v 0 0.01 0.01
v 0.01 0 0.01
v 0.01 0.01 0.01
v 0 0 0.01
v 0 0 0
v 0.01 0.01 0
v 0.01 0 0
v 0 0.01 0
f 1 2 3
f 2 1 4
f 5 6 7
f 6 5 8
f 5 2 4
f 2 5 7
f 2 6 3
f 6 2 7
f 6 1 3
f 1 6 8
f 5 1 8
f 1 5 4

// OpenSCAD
// file: dock.scad
// umote case v7: the charging dock (as v6, with the pocket cut from the keel envelope) and its swappable contact plates (A: P75 probes + magnets, B: a
// ready-made magnetic connector's other half).

// ---------- dock ----------
// Holds the remote upright on its bottom end, leaning back dock_lean, screen towards the user. Two
// P75-B1 probes stand pogo_proud out of the pocket floor (the remote's end face), so they compress
// that much onto the brass pads; two 10 x 2 magnets face the remote's. Built in remote coordinates.
dock_lean = 15;  pogo_proud = 0.75;  dock_pocket = 16;  dock_g = 0.4;
usbc_bo = [13, 11, 4];              // USB-C breakout board pocket [CHECK]
module remote_to_world() rotate([dock_lean - 90, 0, 0]) translate([0, -L, 0]) children();
module world_to_remote() translate([0, L, 0]) rotate([90 - dock_lean, 0, 0]) children();
// one straight press-fit hole per probe, right through to the wire channel under the floor (a wider
// wire hole below would leave a ledge facing down); glue if the press fit is loose
module pogo_holes() for (sx = [-1, 1]) translate([sx * pad_x, L - 0.5, pad_z]) rotate([-90, 0, 0]) cylinder(d = pogo_d, h = 40, $fn = 24);
module pogo_tips() for (sx = [-1, 1]) translate([sx * pad_x, L - pogo_proud, pad_z]) rotate([-90, 0, 0]) cylinder(d = 0.74, h = pogo_l, $fn = 16);
module dock_raw() difference() {
  world_to_remote() translate([-32, -16, -20]) cube([64, 34, 20 + 12]);
  intersection() { envelope(dock_g); translate([-50, L - dock_pocket - 30, -20]) cube([100, dock_pocket + 30, 60]); }
  world_to_remote() translate([-usbc_bo[0] / 2, 18 - usbc_bo[1] + 0.01, -20 - 0.01]) cube([usbc_bo[0], usbc_bo[1], usbc_bo[2]]);   // breakout, port at the back
  world_to_remote() translate([-1, -2, -20]) cube([2, 20, usbc_bo[2] - 1]);                                                         // wires under the floor
}
// the dock's half of the contacts is a swappable plate too: a block under the remote's end, its top
// the pocket floor; it drops into the dock from the pocket (press fit, a drop of glue if loose)
dp_t = 6.0;
module dp_region(g = 0) translate([-pp_w / 2 - g, L - 2, pp_z0 - g]) cube([pp_w + 2 * g, 2 + dock_g + dp_t + g, pz0 - 0.05 - pp_z0 + 2 * g]);
module dock() difference() { dock_raw(); dp_region(0.2); pogo_holes(); }
module dock_plate_a() difference() {   // P75 probes onto plate A's pads, 10 x 2 magnets facing plate A's
  intersection() { dock_raw(); dp_region(0); }
  pogo_holes();
  for (sx = [-1, 1]) translate([sx * dmag_x, L - 0.5, dmag_z]) rotate([-90, 0, 0]) cylinder(d = magnet[0] + 0.2, h = magnet[1] + 0.6, $fn = 64);
}
module dock_plate_b() difference() {   // the connector's other half, flush with the pocket floor
  intersection() { dock_raw(); dp_region(0); }
  translate([-conn_b[0] / 2 - 0.15, L - 1, pad_z - conn_b[1] / 2 - 0.15]) cube([conn_b[0] + 0.3, dp_t + 5, conn_b[1] + 0.3]);
  for (sx = [-1, 1]) translate([sx * conn_b[3] / 2, L + dock_g + dp_t + 0.01, pad_z]) rotate([90, 0, 0]) cylinder(d = conn_b[4], h = 4.0, $fn = 24);
}
// file: backs.scad
// umote case v7: the two BACK PLATES. Each is flat on its outside, so it prints outside down with
// nothing but the foot chamfer touching the bed; they meet at the keel line (y_ap) on a 45 deg
// bevel. The head plate carries the display posts and the wheel's well and is held by 6 screws
// (4 through the display's corner holes into the face bosses, 2 into the cheeks). The key plate is
// the battery door: two tongues under the cheeks, the bevel, and 2 screws at the bottom end.
scarf_x = 18.5;  sc_step = 0.8;     // bevel across the middle (|x| < scarf_x), after a 0.8 square edge
post_d = 5.2;  post_base = [7.5, 3.4];   // display posts: d under the board; d and top z of the wider foot (takes the sunk screw head)
rib_x = [-15, 0, 15];  rib_w2 = 2.4;     // battery seat ribs (the space between them is free for wires)

// the head plate's side of the split; g moves the cut (negative: towards the key side)
module head_side(g = 0) union() {
  translate([-100, -200, -50]) cube([200, 200 + y_ap - g, 100]);
  translate([-scarf_x, 0, 0]) rotate([90, 0, 90]) linear_extrude(2 * scarf_x)
    polygon([[y_ap - 1, z_ap + sc_step], [y_ap - g, z_ap + sc_step], [y_ap - g + 4, z_ap + sc_step + 4], [y_ap - 1, z_ap + sc_step + 4]]);
}
module plate_layer() difference() { envelope(); above_seam(); }
module vgroove() translate([0, y_ap + 0.075, z_ap]) rotate([45, 0, 0]) cube([80, 0.75, 0.75], center = true);   // the seam reads as one 0.5 V line
// locating lip inside the shell's side walls, with a stepped lead-in
module lip(y0, y1) intersection() {
  translate([-50, y0, -50]) cube([100, y1 - y0, 100]);
  union() {
    intersection() { band(back_t - 0.01, back_t + lip_h - 0.6); translate([0, 0, -40]) linear_extrude(80) difference() { plan(wall + lip_clr); plan(wall + lip_clr + lip_w); } }
    intersection() { band(back_t + lip_h - 0.61, back_t + lip_h); translate([0, 0, -40]) linear_extrude(80) difference() { plan(wall + lip_clr + 0.5); plan(wall + lip_clr + lip_w); } }
  }
}
// M2 countersunk from the back at p, the head's top at z
module csk_at(p, z) translate([p[0], p[1], 0]) {
  translate([0, 0, z - m2[3]]) m2_csk(30);
  translate([0, 0, -30]) cylinder(d = m2[2], h = 30 + z - m2[3] + 0.01, $fn = 32);
}

module head_back() difference() {
  union() {
    intersection() { plate_layer(); head_side(); }
    intersection() { above_back(back_t - 0.01); union() {
      lip(12, y_head_end - 0.6);
      for (h = holes) translate([h[0], h[1], -30]) { cylinder(d = post_d, h = 30 + db_z0, $fn = 48); cylinder(d = post_base[0], h = 30 + post_base[1], $fn = 48); }
    } }
  }
  wheel_room();
  for (h = holes) csk_at(h, max(z_seat, zb(h[1]) + m2[3]));
  for (p = s2) csk_at(p, zb(p[1]) + m2[3]);
  vgroove();
}
batt_stop = [[-8, 4], [8, 4]];      // x, width: two low wedges at the battery's top end
module key_back() difference() {
  union() {
    difference() { plate_layer(); head_side(-0.15); }
    intersection() { above_back(back_t - 0.01); union() {
      lip(y_ap + 4.5, 170);
      for (x = rib_x) translate([x - rib_w2 / 2, batt_y0 + 2, -30]) cube([rib_w2, batt[1] - 4, 30 + floor_t]);
      // 45 deg face towards the battery: the plate comes off along that line
      for (s = batt_stop) let(b = batt_y0 - 0.4) translate([s[0] - s[1] / 2, 0, 0]) rotate([90, 0, 90]) linear_extrude(s[1])
        polygon([[b, -30], [b, floor_t], [b - 1.2, floor_t + 1.2], [b - 3.0, floor_t + 1.2], [b - 3.0, -30]]);
      for (g = groove_x) translate([g[0] + fit, 0, 0]) rotate([90, 0, 90]) linear_extrude(g[1] - g[0] - 2 * fit) tongue2d(0);
    } }
  }
  for (p = ps) csk_at(p, zb(p[1]) + m2[3]);
  vgroove();
}
// print orientation: outside down. Turning about x by atan(-slope) lays the plate's plane flat.
module head_back_print() translate([0, 0, -zb_tip * cos(atan(-kh))]) rotate([atan(-kh), 0, 0]) children();
module key_back_print() translate([0, 0, -(z_ap - kk * y_ap) * cos(atan(-kk))]) rotate([atan(-kk), 0, 0]) children();
// file: wheel.scad
// umote case v7: the roller's bought parts (for the fit check and the viewer) and the printed wheel.
// Unchanged from v6: EC11 on its side, shaft along -x, bushing through a bulkhead with its nut.
win = [whl_w + 0.8, 2 * sqrt(pow(whl_d / 2 + whl_gap, 2) - pow(pz0 - axle_z, 2))];   // wheel window in the face: x, y
room_y1 = y_key_start - col_wall;
s2 = [for (sx = [-1, 1]) [sx * 20.2, cy + 6.5]];           // head plate -> cheeks

module ec11_model() {
  translate([ec11_xf, cy - ec11_d / 2, axle_z - ec11_w / 2]) cube([ec11_h, ec11_d, ec11_w]);                  // body
  translate([ec11_xf + 0.01, cy, axle_z]) rotate([0, -90, 0]) cylinder(d = ec11_bush[0], h = ec11_bush[1] + 0.01, $fn = 48);   // bushing
  translate([ec11_xf, cy, axle_z]) rotate([0, -90, 0]) difference() {                                              // D shaft
    cylinder(d = ec11_shaft[0], h = ec11_shaft[1], $fn = 48);
    translate([-10, ec11_shaft[2] - ec11_shaft[0] / 2, ec11_shaft[1] - ec11_shaft[3]]) cube([20, 10, 20]);
  }
  // pins: out of the body's side, bent back through the carrier, trimmed 1.0 past it
  for (r = [0, 1], k = r == 0 ? [-1, 0, 1] : [-1, 1]) let(py = cy + ec11_rows[r], pz = axle_z + k * ec11_pitch) {
    translate([ec11_xf + ec11_h - 0.01, py - 0.4, pz - 0.4]) cube([carrier[0] + 1.0, 0.8, 0.8]);
    hull() { translate([ec11_xf + ec11_h - 0.8, py - 0.4, pz - 0.4]) cube([0.8, 0.8, 0.8]);
             translate([ec11_xf + ec11_h - 0.8, cy + sign(ec11_rows[r]) * (ec11_d / 2 - 0.5) - 0.4, pz - 0.4]) cube([0.8, 0.8, 0.8]); }
  }
}
module ec11_nut_model() translate([ec11_xf - bulk_t - ec11_nut[1], cy, axle_z]) rotate([0, 90, 0])
  rotate(30) cylinder(d = ec11_nut[0] / cos(30), h = ec11_nut[1], $fn = 6);
module carrier_model() translate([ec11_xf + ec11_h, cy - 8.75, 0.1]) cube([carrier[0], carrier[1], carrier[2]]);

// knurled wheel, D-bore for the EC11 shaft
module wheel() { difference() {
  rotate([0, 90, 0]) cylinder(d = whl_d, h = whl_w, center = true, $fn = 96);
  for (a = [0 : 10 : 359]) rotate([a, 0, 0]) translate([0, 0, whl_d / 2]) cube([whl_w + 1, 0.9, 0.9], center = true);
  rotate([0, 90, 0]) difference() { cylinder(d = ec11_shaft[0] + 0.15, h = whl_w + 2, center = true, $fn = 48);
    translate([ec11_shaft[2] - ec11_shaft[0] / 2 + 0.075, -5, -10]) cube([10, 10, 20]); }       // D flat
} }
module wheel_at() translate([whl_x, cy, axle_z]) wheel();
module wheel_room() translate([whl_x, cy, axle_z]) rotate([0, 90, 0]) cylinder(r = whl_d / 2 + whl_gap, h = whl_w + 2 * whl_gap, center = true, $fn = 96);
// file: profile.scad
// umote case v7: the outer form (plan outline, cross-section, the keel). Include after params.scad.

module base2d() { hull() {
  for (sx = [-1, 1]) translate([sx * (W / 2 - tip_r), tip_r]) circle(r = tip_r);
  for (sx = [-1, 1]) translate([sx * (W / 2 - corner_r), L - corner_r]) circle(r = corner_r);
} }
module plan(i = 0) { if (i == 0) base2d(); else offset(r = -i) base2d(); }   // negative i grows it
module rr2d(w, l, r) { offset(r = r) square([w - 2 * r, l - 2 * r], center = true); }

// plan inset of the outer surface. Below eb: z is the height above the local back (a 35 deg bed
// foot, then a quarter ellipse into the side). From roll_z up: the roll round the face.
foot_in = ea * (1 - sqrt(1 - pow((eb - bed_ch) / eb, 2)));
function e_in(z) = z < bed_ch ? foot_in + foot_k * (bed_ch - z)
  : z < eb ? ea * (1 - sqrt(1 - pow((eb - z) / eb, 2)))
  : z < roll_z ? 0 : roll * pow((z - roll_z) / (T - roll_z), 2);

// one hull between two plan slices; a stack of them follows e_in() (each band is convex)
module slab(z0, z1, i0, i1) { hull() {
  translate([0, 0, z0]) linear_extrude(0.01) plan(i0);
  translate([0, 0, z1 - 0.01]) linear_extrude(0.01) plan(i1);
} }
module stack(z0, z1, n, extra = 0) {
  for (k = [0 : n - 1]) { a = z0 + (z1 - z0) * k / n; b = z0 + (z1 - z0) * (k + 1) / n;
    slab(a, b, e_in(a) + extra, e_in(b) + extra); }
}
// the lower half standing on z = 0: the bed foot and the ellipse, then straight up. Sheared along y
// it becomes the head's or the key half's back: vertical lines stay vertical, so the outline and the
// walls are untouched and every cross-section is the same shape let down by zb(y).
module cup(g = 0) union() {
  slab(-g, bed_ch, e_in(0) - g, e_in(bed_ch) - g);
  stack(bed_ch, eb, 12, -g);
  translate([0, 0, eb - 0.01]) linear_extrude(60) plan(-g);
}
module shear_h() multmatrix([[1, 0, 0, 0], [0, 1, 0, 0], [0, kh, 1, zb_tip], [0, 0, 0, 1]]) children();
module shear_k() multmatrix([[1, 0, 0, 0], [0, 1, 0, 0], [0, kk, 1, z_ap - kk * y_ap], [0, 0, 0, 1]]) children();
module upper(g = 0) union() {
  translate([0, 0, -30]) linear_extrude(30 + roll_z) plan(-g);
  stack(roll_z, T, 10, -g);
  if (g > 0) slab(T - 0.01, T + g, e_in(T) - g, e_in(T) - g);
}
// the whole remote's outer form; g grows it all round (the dock's pocket)
module envelope(g = 0) intersection() { upper(g); shear_h() cup(g); shear_k() cup(g); }

// everything d above the back surface (d = back_t: above the seam between the shell and the plates)
module slabs_up() translate([-100, -200, 0]) cube([200, 700, 100]);
module above_back(d) intersection() { shear_h() translate([0, 0, d]) slabs_up(); shear_k() translate([0, 0, d]) slabs_up(); }
module above_seam() above_back(back_t);
module band(d0, d1) difference() { above_back(d0); above_back(d1); }      // between two offsets of the back

// the face: the envelope's top pan_t
module ycut(y0, y1) { intersection() { children(); translate([-60, y0, -40]) cube([120, y1 - y0, 80]); } }

// horizontal holes with a teardrop roof: towards +z, or towards -z (down = true) for the shell,
// which prints face down
module td_y(d, y0, y1, down = false) translate([0, y0, 0]) rotate([-90, 0, 0]) linear_extrude(y1 - y0) mirror([0, down ? 1 : 0])
  polygon(concat([for (k = [0 : 23]) let(t = -38.7 + 257.4 * k / 23) [d / 2 * cos(t), d / 2 * sin(t)]], [[0, -d / 2 * 1.6]]));
module td_x(d, x0, x1, down = false) translate([x0, 0, 0]) rotate([0, 90, 0]) linear_extrude(x1 - x0) mirror([down ? 1 : 0, 0])
  polygon(concat([for (k = [0 : 23]) let(t = 231.3 + 257.4 * k / 23) [d / 2 * cos(t), d / 2 * sin(t)]], [[-d / 2 * 1.6, 0]]));
// main file
// umote case v7 "Keel": part dispatcher. Print parts come out in print orientation; asm_* parts are
// in model (assembled) coordinates for the fit check and viewer.
// Render: openscad -D 'part="shell"' -o shell.stl case/v7/umote_v7.scad   (or case/v7/export.sh)
part = "params";
$fn = 64;
include <params.scad>
include <profile.scad>
include <wheel.scad>
include <keys.scad>
include <shell.scad>
include <backs.scad>
include <dock.scad>

// every value the checks need, as one JSON line
P = [["W", W], ["wall", wall], ["tip_wall", tip_wall], ["T", T], ["L", L], ["theta", theta], ["clr", clr],
  ["board_gap", board_gap], ["usb_x", usb_x], ["usb_in", usb_in], ["usb_body_h", usb_body_h], ["usb_floor", usb_floor],
  ["db_w", db_w], ["db_l", db_l], ["db_pcb", db_pcb], ["db_front", db_front], ["db_back", db_back], ["db_y0", db_y0],
  ["db_end", db_end], ["db_top", db_top], ["db_z0", db_z0], ["lcd_from_ant", lcd_from_ant], ["lcd_l", lcd_l],
  ["bb_w", bb_w], ["bb_l", bb_l], ["bb_pcb", bb_pcb], ["bb_y0", bb_y0], ["bb_z0", bb_z0], ["bb_top", bb_top],
  ["sw_body", sw_body], ["sw_total", sw_total], ["smd_h", smd_h], ["top_parts", top_parts],
  ["batt", batt], ["batt_y0", batt_y0], ["batt_z0", batt_z0], ["floor_t", floor_t],
  ["ir_x", ir_x], ["ir_z", ir_z], ["front_in", front_in], ["pan_t", pan_t], ["pz0", pz0],
  ["y_head_end", y_head_end], ["y_key_start", y_key_start], ["cy", cy], ["axle_z", axle_z],
  ["whl_d", whl_d], ["whl_w", whl_w], ["whl_x", whl_x], ["whl_proud", whl_proud], ["whl_gap", whl_gap], ["whl_well", whl_well],
  ["ec11_xf", ec11_xf], ["ec11_h", ec11_h], ["ec11_w", ec11_w], ["ec11_d", ec11_d], ["ec11_bush", ec11_bush], ["ec11_shaft", ec11_shaft],
  ["ec11_nut", ec11_nut], ["carrier", carrier], ["bulk_t", bulk_t], ["room_x", room_x], ["col_wall", col_wall],
  ["s2", s2], ["ps", ps], ["m2", m2], ["holes", holes], ["win", win], ["groove_x", groove_x], ["fit", fit],
  ["back_t", back_t], ["zb_tip", zb_tip], ["y_ap", y_ap], ["z_ap", z_ap], ["kh", kh], ["kk", kk], ["z_seat", z_seat],
  ["lip_clr", lip_clr], ["lip_w", lip_w], ["lip_h", lip_h], ["tap_depth", tap_depth], ["boss_hole", boss_hole],
  ["min_wall", min_wall], ["min_panel", min_panel], ["min_land", min_land], ["min_skin", min_skin],
  ["magnet", magnet], ["dmag_x", dmag_x], ["dmag_z", dmag_z], ["pad_insert", pad_insert], ["pad_x", pad_x], ["pad_z", pad_z],
  ["pogo_d", pogo_d], ["pogo_l", pogo_l], ["roll_z", roll_z], ["roll", roll], ["cap_proud", cap_proud],
  ["pp_w", pp_w], ["pp_z0", pp_z0], ["pp_t", pp_t], ["conn_b", conn_b], ["end_block_y", end_block_y],
  ["cap_hole", cap_hole], ["cap_d", cap_d], ["side_clr", side_clr], ["batt_end", batt_end], ["bb_end", bb_end], ["eye", eye],
  ["clip_y", clip_y], ["rib_x", rib_x], ["dock_g", dock_g]];
function jv(v) = is_list(v) ? str("[", jl(v, 0), "]") : str(v);
function jl(v, i) = i >= len(v) ? "" : str(jv(v[i]), i < len(v) - 1 ? "," : "", jl(v, i + 1));
function jo(p, i) = i >= len(p) ? "" : str("\"", p[i][0], "\":", jv(p[i][1]), i < len(p) - 1 ? "," : "", jo(p, i + 1));

// face down = turned over about y (a true flip: v6 used a mirror here, which made mirror-image panels)
module face_down() translate([0, 0, T]) rotate([0, 180, 0]) children();
// the 224 mm shell lies corner to corner on a 220 bed (it needs 196 x 196)
module shell_print() rotate([0, 0, 45]) translate([0, -L / 2, 0]) face_down() children();
module pp_print() translate([0, 0, -pp_z0]) children();                                    // contact plate: standing on its bottom
module dp_print() translate([0, 0, L + dock_g + dp_t]) rotate([-90, 0, 0]) children();   // dock plate: bottom face down

if (part == "params") { echo(str("PARAMS {", jo(P, 0), "}")); cube(0.01); }
else if (part == "envelope") envelope();
else if (part == "shell") shell_print() shell();
else if (part == "asm_shell") shell();
else if (part == "head_back") head_back_print() head_back();
else if (part == "asm_head_back") head_back();
else if (part == "key_back") key_back_print() key_back();
else if (part == "asm_key_back") key_back();
else if (part == "pogo_plate_a") pp_print() pogo_plate_a();
else if (part == "pogo_plate_b") pp_print() pogo_plate_b();
else if (part == "asm_pogo_plate_a") pogo_plate_a();
else if (part == "asm_pogo_plate_b") pogo_plate_b();
else if (part == "dock_plate_a") dp_print() dock_plate_a();
else if (part == "dock_plate_b") dp_print() dock_plate_b();
else if (part == "asm_dock_plate_a") dock_plate_a();
else if (part == "asm_dock_plate_b") dock_plate_b();
else if (part == "wheel") translate([0, 0, whl_w / 2]) rotate([0, 90, 0]) wheel();
else if (part == "asm_wheel") wheel_at();
else if (part == "asm_ec11") ec11_model();
else if (part == "asm_nut") ec11_nut_model();
else if (part == "asm_carrier") carrier_model();
else if (part == "caps") caps_plate();
else if (part == "caps_asm") caps_asm();
else if (part == "caps_asm_pressed") caps_asm(press = 0.3);
else if (part == "caps_asm_rocker_tilt") caps_asm(tip = 0.3);
else if (part == "dpad_ring") translate([0, 0, T + 0.5]) rotate([0, 180, 0]) dpad_ring_at();
else if (part == "asm_dpad_ring") dpad_ring_at();
else if (part == "dock") translate([0, 0, 20]) remote_to_world() dock();
else if (part == "asm_dock") dock();
else if (part == "asm_pogo") pogo_tips();
else if (part == "asm_all") asm_all();
else if (part == "asm_section") difference() { asm_all(); translate([-60, -10, -10]) cube([60 + sec_x, L + 20, 40]); }
else if (part == "t0_screw_gauge") t0();
else if (part == "t1_wheel_zone") t1();
else if (part == "t2_bottom_end") t2();
else assert(false, str("unknown part ", part));

sec_x = -4;  // asm_section: cut away x < sec_x
module asm_all() {
  color("dimgray") shell();
  color("white") head_back();
  color("white") key_back();
  color("gold") pogo_plate_a();
  color("orange") wheel_at();
  color("silver") { ec11_model(); ec11_nut_model(); }
  color("green") carrier_model();
}
module dpad_ring_at() translate(concat(dc, [0])) dpad_ring();

// ---------- test pieces: print these before the full set ----------
// T0 screw gauge: a bar with five self-tap holes (1.7 .. 2.1 as drawn), a clearance hole and a
// countersink, each marked by notches on the edge (1 notch = 1.7). Drive an M2 into each: the right
// one bites firmly without splitting the bar. Tell me which and m2[0] in params.scad is set to it.
gauge = [1.7, 1.8, 1.9, 2.0, 2.1];
module t0() difference() {
  hull() { cube([44, 8, 7.7]); translate([0.3, 0.3, 7.7]) cube([43.4, 7.4, 0.3]); }
  for (i = [0 : 4]) translate([4 + i * 6.5, 4, 1]) { cylinder(d = gauge[i], h = 10, $fn = 48); translate([0, 0, 6.6]) cylinder(d1 = gauge[i], d2 = gauge[i] + 0.9, h = 0.5, $fn = 48); }
  for (i = [0 : 4], n = [0 : i]) translate([4 + i * 6.5 - i * 0.6 + n * 1.2 - 0.3, -0.01, 5]) cube([0.6, 0.6, 4]);
  translate([38.5, 4, -1]) cylinder(d = m2[1], h = 10, $fn = 48);
  translate([38.5, 4, 8.01]) mirror([0, 0, 1]) m2_csk(3);
}
// T1 wheel zone: the shell from the display's last screws to the first key (bosses, cheeks,
// bulkhead, wheel window, tongue grooves), the head plate's end, the key plate's start and the wheel
module t1() {
  rotate([0, 0, 90]) translate([0, -cy, 0]) face_down() ycut(y_head_end - 10, y_key_start + 12) shell();
  translate([0, 45 - (y_head_end - 10), 0]) head_back_print() ycut(y_head_end - 10, 400) head_back();
  translate([0, 85 - y_ap, 0]) key_back_print() ycut(-100, y_key_start + 12) key_back();
  translate([40, 20, whl_w / 2]) rotate([0, 90, 0]) wheel();
}
// T2 bottom end: the shell's last 24 mm (end block, plate slot, eyelet, screw pilots), the key
// plate's end and plate A
module t2() {
  translate([0, -L, 0]) face_down() ycut(L - 24, L + 5) shell();
  translate([0, 40 - L, 0]) key_back_print() ycut(L - 24, L + 5) key_back();
  translate([0, 20 - L, 0]) pp_print() pogo_plate_a();
}
